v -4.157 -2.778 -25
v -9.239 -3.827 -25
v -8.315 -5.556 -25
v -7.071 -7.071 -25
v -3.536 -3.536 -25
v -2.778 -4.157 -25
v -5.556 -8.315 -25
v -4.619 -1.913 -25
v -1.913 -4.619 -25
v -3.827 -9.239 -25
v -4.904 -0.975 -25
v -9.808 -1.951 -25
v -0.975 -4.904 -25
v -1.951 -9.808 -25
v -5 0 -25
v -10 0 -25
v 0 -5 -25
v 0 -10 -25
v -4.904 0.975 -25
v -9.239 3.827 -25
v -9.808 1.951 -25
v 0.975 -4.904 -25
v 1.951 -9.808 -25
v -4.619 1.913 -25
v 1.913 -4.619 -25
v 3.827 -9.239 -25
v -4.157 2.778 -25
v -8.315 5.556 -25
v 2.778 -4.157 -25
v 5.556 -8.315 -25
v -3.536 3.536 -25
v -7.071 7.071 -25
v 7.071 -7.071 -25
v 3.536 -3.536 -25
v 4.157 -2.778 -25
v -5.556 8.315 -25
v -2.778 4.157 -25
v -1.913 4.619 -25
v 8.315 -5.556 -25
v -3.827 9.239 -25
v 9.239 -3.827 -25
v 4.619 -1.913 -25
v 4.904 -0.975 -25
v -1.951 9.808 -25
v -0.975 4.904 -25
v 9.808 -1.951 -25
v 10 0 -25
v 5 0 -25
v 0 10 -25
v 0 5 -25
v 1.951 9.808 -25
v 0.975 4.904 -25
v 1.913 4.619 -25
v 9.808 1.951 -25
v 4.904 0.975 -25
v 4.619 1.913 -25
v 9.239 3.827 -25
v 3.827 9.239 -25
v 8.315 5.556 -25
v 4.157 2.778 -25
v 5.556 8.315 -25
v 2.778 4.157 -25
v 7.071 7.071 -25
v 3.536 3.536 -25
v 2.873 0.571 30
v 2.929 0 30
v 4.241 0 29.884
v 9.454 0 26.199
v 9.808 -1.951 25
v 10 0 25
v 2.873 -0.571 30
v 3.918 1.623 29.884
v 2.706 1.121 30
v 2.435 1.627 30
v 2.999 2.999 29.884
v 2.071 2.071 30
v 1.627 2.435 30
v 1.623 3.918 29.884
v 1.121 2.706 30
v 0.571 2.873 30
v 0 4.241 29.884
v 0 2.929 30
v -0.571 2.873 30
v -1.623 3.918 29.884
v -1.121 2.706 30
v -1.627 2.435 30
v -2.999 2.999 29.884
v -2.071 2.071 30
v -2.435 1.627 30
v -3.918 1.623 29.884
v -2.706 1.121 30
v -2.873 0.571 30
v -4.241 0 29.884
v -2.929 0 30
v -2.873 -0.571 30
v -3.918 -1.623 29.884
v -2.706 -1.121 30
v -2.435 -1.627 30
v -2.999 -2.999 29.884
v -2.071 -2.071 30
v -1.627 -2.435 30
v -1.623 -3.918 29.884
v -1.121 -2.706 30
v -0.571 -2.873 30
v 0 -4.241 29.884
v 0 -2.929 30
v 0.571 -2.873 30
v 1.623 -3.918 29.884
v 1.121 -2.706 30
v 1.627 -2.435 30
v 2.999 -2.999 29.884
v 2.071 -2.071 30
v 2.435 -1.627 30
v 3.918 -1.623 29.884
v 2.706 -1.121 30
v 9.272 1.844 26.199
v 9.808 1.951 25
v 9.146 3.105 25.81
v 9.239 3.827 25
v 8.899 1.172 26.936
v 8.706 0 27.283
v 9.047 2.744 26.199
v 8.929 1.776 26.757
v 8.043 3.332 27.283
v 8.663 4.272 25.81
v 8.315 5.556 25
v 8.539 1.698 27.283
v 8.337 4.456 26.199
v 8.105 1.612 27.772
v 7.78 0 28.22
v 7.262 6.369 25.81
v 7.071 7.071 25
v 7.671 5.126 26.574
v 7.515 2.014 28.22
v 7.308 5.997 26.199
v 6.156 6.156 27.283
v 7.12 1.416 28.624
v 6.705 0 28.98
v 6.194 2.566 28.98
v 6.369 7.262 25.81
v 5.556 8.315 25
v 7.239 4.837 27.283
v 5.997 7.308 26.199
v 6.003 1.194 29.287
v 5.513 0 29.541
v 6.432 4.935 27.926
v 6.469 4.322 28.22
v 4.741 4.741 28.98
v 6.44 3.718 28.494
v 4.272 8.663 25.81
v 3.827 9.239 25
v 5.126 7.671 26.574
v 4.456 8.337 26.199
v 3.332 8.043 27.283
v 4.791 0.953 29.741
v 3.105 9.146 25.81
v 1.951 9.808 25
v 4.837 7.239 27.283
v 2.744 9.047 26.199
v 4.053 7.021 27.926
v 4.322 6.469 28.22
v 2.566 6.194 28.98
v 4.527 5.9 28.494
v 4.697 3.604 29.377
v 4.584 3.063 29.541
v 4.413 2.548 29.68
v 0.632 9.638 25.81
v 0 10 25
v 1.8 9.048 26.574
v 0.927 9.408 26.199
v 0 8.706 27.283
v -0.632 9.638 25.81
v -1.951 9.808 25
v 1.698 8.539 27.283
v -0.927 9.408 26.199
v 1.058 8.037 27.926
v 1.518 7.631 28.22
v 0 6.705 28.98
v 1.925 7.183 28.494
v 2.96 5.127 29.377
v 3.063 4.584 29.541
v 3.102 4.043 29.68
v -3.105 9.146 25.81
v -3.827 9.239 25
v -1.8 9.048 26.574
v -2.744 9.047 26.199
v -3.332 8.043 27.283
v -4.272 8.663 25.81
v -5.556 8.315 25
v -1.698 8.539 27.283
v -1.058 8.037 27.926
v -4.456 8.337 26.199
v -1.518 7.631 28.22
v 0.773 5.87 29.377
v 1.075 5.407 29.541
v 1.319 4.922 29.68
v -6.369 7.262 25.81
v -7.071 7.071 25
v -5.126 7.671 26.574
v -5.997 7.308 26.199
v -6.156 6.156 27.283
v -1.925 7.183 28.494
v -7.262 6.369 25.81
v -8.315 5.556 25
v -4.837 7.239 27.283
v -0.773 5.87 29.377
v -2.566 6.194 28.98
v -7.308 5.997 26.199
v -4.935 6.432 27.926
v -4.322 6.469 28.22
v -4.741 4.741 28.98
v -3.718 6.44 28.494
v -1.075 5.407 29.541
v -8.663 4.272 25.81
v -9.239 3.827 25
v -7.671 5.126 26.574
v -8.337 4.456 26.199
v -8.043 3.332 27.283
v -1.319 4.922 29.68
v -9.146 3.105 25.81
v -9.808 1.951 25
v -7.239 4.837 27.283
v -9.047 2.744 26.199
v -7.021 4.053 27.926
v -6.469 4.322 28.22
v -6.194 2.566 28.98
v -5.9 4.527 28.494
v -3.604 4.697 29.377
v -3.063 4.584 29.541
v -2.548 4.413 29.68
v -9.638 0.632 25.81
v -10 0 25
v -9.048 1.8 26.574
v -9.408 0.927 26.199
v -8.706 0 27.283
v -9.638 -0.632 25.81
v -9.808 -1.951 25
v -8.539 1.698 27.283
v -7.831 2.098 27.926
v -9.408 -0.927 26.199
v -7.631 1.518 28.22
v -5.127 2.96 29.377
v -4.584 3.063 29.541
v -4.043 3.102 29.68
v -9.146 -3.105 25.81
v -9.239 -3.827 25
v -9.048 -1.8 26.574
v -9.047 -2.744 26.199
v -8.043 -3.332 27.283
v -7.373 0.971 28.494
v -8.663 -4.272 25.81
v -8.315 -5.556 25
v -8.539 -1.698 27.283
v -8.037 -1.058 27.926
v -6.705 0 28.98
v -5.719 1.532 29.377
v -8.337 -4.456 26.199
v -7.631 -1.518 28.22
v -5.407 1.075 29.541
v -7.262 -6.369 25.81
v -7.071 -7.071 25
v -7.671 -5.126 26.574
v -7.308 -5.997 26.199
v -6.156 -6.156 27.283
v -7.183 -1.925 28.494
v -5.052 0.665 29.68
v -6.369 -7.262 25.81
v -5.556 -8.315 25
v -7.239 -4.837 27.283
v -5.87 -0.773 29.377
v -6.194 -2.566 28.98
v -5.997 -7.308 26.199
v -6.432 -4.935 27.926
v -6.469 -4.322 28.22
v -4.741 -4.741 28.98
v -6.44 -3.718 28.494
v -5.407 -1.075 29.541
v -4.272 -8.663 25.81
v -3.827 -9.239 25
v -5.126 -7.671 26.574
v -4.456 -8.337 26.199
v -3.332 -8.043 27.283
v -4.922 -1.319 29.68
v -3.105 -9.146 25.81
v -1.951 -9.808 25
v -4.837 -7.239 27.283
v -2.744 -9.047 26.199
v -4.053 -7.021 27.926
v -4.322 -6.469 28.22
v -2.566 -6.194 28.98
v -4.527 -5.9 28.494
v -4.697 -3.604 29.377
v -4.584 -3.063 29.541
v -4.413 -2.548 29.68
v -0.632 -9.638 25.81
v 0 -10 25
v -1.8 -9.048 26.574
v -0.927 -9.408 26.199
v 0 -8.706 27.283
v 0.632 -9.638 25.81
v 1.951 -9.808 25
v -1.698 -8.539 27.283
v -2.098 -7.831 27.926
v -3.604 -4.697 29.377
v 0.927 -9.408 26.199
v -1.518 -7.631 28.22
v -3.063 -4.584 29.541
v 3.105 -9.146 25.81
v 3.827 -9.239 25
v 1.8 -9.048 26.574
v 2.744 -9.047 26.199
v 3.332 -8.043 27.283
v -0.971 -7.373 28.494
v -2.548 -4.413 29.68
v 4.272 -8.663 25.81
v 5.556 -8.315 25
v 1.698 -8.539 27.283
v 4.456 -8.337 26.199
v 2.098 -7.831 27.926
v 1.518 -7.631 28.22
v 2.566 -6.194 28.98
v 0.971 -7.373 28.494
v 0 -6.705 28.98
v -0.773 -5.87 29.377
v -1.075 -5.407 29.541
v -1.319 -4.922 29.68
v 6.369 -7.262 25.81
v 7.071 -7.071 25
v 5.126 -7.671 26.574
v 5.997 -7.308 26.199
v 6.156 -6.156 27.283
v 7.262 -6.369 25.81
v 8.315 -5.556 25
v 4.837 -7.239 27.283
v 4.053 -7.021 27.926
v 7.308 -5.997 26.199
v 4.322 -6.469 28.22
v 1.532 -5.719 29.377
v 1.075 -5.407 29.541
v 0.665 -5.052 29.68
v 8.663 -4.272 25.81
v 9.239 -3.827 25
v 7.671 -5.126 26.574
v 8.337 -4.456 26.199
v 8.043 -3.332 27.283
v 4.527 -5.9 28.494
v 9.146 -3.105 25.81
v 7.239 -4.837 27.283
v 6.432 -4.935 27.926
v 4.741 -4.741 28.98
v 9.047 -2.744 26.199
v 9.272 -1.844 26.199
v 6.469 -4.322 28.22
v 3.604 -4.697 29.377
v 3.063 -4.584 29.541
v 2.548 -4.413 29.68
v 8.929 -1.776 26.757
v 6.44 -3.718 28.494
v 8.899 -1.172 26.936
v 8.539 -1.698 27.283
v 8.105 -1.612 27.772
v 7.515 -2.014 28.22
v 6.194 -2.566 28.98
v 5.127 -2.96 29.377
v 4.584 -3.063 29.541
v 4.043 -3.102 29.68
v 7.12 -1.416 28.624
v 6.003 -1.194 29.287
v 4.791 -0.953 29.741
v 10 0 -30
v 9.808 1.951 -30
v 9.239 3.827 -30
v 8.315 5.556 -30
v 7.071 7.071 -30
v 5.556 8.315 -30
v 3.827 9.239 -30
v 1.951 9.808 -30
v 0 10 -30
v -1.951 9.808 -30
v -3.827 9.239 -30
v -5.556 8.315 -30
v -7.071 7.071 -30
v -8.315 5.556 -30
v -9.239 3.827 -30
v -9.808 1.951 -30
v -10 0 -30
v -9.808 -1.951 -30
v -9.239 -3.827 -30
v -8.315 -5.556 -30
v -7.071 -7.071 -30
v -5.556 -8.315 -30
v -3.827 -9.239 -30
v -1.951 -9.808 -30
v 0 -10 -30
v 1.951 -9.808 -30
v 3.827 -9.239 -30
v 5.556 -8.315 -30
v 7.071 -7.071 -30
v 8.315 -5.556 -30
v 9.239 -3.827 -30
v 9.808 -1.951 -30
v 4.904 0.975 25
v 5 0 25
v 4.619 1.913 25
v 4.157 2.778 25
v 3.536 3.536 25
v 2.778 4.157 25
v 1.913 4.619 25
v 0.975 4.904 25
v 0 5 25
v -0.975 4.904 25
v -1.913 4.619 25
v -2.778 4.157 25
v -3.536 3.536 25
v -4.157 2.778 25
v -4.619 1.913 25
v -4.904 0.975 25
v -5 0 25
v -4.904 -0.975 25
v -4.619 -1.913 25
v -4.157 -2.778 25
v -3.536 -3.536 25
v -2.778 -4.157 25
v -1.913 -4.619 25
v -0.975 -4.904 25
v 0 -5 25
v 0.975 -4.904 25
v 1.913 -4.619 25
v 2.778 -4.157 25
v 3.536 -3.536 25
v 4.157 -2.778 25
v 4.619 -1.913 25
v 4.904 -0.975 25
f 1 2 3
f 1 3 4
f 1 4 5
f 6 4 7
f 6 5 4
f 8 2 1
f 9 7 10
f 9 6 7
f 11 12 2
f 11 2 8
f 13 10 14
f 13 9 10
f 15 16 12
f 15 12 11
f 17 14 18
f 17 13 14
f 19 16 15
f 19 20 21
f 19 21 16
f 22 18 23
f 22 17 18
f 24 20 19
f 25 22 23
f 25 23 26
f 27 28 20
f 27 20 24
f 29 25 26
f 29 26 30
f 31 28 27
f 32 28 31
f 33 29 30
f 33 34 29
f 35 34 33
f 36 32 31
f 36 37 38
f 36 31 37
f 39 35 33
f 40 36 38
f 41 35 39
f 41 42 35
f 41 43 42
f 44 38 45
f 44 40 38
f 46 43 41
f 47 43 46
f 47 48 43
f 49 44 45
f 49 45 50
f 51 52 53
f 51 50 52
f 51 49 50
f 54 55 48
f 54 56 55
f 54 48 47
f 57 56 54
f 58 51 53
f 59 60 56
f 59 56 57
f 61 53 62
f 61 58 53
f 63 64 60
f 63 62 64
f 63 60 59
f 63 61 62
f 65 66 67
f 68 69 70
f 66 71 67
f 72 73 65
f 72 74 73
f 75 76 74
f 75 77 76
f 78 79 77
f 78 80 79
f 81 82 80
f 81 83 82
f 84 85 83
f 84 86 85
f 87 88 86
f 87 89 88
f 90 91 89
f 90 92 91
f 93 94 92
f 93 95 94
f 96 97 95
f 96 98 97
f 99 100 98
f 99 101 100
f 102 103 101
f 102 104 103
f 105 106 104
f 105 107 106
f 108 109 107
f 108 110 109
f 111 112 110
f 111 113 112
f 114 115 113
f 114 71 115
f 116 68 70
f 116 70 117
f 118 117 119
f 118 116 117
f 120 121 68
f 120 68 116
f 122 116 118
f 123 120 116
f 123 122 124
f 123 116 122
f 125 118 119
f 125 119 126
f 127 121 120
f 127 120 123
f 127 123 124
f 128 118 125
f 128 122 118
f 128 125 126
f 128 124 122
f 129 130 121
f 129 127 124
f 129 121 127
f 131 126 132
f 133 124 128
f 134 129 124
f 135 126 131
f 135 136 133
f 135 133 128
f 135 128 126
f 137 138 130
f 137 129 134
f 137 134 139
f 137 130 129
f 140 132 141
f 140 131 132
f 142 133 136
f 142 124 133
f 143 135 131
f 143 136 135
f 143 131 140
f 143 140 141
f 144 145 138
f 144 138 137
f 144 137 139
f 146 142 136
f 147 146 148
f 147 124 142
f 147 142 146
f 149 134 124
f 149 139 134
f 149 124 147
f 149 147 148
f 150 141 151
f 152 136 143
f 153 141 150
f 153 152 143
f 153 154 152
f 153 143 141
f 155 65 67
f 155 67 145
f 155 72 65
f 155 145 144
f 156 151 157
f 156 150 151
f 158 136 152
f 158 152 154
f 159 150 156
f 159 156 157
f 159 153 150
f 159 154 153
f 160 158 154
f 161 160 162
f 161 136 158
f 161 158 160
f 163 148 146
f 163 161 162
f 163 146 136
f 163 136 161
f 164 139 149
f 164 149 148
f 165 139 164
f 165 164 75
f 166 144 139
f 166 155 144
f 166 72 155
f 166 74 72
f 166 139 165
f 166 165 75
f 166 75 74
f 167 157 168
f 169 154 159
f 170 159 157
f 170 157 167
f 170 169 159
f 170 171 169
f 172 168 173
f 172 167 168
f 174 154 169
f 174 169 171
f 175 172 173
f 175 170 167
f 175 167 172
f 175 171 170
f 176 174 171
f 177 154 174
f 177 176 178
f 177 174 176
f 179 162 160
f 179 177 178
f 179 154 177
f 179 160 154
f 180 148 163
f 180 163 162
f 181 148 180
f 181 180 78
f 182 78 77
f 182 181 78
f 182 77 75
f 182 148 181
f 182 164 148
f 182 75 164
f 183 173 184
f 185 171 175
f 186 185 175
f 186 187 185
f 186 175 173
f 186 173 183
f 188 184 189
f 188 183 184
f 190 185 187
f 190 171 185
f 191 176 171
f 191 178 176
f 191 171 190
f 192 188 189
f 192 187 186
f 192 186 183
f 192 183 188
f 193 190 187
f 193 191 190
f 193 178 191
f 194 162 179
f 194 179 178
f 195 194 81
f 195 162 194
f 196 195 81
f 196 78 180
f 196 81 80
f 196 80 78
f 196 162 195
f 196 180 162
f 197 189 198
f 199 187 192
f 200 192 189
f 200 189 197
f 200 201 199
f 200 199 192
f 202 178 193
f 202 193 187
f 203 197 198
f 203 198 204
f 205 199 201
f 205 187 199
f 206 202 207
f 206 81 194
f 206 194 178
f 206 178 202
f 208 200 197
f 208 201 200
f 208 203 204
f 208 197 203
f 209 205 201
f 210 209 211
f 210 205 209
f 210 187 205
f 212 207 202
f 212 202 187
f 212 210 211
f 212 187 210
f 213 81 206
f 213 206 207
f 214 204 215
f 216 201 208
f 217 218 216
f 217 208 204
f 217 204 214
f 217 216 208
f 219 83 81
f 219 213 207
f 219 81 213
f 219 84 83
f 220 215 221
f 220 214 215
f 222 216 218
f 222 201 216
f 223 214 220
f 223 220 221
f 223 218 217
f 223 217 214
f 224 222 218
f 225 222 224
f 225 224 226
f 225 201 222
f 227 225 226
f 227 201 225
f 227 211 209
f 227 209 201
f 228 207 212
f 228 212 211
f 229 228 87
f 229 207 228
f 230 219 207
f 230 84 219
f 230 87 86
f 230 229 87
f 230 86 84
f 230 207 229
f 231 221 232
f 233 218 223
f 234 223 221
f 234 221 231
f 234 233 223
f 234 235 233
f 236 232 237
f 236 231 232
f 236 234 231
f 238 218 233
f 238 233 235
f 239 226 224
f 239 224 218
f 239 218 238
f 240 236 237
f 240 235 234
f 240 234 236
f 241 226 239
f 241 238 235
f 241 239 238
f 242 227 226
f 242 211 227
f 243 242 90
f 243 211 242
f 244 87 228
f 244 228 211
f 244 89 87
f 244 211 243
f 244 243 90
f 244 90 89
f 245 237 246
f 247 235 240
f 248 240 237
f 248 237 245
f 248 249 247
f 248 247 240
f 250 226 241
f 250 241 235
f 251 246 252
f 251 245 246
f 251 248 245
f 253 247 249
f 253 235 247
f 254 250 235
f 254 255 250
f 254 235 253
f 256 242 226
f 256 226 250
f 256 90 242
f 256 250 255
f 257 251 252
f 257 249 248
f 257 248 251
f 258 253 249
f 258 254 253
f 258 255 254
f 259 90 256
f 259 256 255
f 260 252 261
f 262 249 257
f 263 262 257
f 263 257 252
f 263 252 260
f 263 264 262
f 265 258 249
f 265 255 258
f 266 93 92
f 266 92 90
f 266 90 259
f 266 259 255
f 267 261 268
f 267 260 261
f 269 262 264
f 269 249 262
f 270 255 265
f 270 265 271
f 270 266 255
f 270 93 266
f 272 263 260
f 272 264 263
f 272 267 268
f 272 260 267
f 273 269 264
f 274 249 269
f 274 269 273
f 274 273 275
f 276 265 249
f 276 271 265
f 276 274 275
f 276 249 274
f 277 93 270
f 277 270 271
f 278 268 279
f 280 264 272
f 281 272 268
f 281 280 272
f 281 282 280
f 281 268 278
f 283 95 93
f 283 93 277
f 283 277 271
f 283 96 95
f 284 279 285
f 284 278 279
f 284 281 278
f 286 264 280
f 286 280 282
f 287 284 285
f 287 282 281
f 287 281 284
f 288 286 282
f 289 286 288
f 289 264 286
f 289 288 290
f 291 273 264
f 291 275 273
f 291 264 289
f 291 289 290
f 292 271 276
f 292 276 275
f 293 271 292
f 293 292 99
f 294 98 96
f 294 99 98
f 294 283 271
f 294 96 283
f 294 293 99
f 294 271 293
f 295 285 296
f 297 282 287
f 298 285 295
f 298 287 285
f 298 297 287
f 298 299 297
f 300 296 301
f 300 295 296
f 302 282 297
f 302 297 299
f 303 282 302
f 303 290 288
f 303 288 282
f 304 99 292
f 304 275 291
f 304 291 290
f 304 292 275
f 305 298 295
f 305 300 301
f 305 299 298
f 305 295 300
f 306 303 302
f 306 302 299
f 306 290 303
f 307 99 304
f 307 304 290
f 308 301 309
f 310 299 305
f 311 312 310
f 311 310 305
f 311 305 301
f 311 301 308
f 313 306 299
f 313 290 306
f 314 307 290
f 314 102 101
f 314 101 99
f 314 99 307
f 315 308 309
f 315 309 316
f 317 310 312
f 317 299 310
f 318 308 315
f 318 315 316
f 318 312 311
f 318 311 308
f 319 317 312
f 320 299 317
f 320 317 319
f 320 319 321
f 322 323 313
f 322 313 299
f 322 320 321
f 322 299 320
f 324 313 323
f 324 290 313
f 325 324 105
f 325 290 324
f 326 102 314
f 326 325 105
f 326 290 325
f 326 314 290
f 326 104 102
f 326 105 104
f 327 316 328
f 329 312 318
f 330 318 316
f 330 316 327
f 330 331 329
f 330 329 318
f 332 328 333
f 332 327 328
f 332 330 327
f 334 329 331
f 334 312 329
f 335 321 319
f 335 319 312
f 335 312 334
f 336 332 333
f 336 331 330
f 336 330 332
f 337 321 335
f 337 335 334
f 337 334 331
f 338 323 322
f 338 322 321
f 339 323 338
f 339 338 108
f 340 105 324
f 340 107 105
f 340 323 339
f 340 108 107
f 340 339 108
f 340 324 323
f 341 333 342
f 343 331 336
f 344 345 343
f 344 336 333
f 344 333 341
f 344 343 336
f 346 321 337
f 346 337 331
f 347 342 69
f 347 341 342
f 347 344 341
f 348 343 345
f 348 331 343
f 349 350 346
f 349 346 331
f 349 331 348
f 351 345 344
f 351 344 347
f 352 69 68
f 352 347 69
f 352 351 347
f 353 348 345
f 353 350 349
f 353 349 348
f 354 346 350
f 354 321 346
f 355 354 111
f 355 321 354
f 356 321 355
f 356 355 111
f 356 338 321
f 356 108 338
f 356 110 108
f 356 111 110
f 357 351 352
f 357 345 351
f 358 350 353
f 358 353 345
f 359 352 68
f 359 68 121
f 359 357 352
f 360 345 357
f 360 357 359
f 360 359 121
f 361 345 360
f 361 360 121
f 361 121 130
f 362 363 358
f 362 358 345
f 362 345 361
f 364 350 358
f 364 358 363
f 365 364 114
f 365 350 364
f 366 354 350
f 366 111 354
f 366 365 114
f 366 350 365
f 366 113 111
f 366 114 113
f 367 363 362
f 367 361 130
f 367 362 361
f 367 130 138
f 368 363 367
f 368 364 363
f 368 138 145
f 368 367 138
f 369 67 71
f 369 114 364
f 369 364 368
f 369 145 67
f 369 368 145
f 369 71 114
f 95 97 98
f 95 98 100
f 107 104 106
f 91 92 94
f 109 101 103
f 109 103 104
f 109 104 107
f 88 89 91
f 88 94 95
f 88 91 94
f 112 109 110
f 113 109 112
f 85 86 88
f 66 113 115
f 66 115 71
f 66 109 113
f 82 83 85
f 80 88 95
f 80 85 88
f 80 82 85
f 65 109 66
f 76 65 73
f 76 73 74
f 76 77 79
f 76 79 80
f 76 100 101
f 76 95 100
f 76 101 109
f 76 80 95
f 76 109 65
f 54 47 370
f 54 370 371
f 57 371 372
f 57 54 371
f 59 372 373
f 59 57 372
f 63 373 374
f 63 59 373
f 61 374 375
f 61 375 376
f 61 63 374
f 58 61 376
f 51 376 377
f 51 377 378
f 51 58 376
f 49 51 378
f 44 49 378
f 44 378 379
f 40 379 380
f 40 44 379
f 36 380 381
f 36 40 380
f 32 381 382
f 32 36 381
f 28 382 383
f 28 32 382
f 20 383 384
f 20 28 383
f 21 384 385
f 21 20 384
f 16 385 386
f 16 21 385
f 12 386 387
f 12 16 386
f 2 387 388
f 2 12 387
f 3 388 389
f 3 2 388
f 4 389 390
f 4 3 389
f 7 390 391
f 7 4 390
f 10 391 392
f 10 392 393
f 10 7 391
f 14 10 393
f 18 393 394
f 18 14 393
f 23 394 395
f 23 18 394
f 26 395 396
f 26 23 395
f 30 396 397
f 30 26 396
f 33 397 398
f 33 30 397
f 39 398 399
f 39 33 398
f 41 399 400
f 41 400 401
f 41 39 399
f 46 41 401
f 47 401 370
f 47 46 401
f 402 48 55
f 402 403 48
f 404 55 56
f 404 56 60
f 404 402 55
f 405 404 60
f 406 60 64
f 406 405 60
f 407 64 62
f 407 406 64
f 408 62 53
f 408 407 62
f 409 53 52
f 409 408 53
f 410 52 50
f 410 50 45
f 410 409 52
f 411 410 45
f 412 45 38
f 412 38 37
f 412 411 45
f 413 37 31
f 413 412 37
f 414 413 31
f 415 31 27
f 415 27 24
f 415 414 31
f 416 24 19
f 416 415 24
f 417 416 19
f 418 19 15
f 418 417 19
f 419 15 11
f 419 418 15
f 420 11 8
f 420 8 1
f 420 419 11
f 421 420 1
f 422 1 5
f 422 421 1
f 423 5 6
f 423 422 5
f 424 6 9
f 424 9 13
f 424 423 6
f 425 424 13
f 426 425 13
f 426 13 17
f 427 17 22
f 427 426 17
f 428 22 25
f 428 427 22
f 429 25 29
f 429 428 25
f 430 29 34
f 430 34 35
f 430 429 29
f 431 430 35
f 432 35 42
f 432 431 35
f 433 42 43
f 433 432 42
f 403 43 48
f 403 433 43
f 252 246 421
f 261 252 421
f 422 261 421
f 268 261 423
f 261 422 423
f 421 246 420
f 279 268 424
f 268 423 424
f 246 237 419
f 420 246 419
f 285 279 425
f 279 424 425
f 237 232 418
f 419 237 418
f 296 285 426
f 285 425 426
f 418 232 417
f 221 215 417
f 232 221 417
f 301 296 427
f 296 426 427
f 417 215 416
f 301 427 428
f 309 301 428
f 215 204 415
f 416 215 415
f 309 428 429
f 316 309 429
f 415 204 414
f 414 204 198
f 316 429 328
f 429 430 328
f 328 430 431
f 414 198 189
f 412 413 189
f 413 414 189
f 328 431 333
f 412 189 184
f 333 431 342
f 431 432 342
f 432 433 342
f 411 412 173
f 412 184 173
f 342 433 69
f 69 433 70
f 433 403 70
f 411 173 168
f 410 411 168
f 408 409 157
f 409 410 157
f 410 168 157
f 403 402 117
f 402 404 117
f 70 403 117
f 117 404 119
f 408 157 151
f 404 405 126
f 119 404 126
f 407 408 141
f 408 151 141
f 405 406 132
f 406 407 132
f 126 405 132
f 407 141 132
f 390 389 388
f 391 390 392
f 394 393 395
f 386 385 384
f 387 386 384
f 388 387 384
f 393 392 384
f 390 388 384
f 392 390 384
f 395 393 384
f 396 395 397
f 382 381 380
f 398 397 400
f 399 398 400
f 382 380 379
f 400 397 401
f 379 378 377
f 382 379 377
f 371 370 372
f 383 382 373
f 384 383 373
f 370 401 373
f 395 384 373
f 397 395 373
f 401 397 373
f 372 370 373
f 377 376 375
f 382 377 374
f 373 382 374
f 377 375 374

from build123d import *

# Parameters (mm, degrees)
SKETCH1_R           = 5
BOSS_EXTRUDE1_DEPTH = 25
SKETCH2_R           = 10
BOSS_EXTRUDE2_DEPTH = 5
FILLET1_R           = 7.5


with BuildPart() as part:
    # Sketch1 → Boss-Extrude1 (new, symmetric)
    with BuildSketch(Plane.XY):
        Circle(SKETCH1_R)
    extrude(amount=BOSS_EXTRUDE1_DEPTH, both=True)

    # Sketch2 → Boss-Extrude2 (add)
    with BuildSketch(Plane.XY.offset(25)):
        Circle(SKETCH2_R)
    boss_extrude2 = extrude(amount=BOSS_EXTRUDE2_DEPTH)

    # Mirror1: Boss-Extrude2 across plane
    add(boss_extrude2.mirror(Plane.XY))

    # Fillet1
    # the kernel refuses this fillet: 7.5 mm, written as the material it takes off along each edge
    with BuildSketch(Plane(origin=(0, 0, 30), x_dir=(1, 0, 0), z_dir=(0, -1, 0))) as fillet1_piece_1:
        with BuildLine():
            CenterArc((2.928932188, -7.5), FILLET1_R, 19.471220634, 70.528779366)
            Line((2.928932188, 0), (2.928932188, 0.15))
            Line((2.928932188, 0.15), (10, 0.15))
            Line((10, 0.15), (10.15, 0))
            ThreePointArc((10.15, 0), (10.15, -2.5), (10.141421356, -4.95))
            Line((10.141421356, -4.95), (10, -5))
        make_face()
    revolve(axis=Axis((0, 0, 30), (0, 0, 1)), mode=Mode.SUBTRACT)


solid = part.part
